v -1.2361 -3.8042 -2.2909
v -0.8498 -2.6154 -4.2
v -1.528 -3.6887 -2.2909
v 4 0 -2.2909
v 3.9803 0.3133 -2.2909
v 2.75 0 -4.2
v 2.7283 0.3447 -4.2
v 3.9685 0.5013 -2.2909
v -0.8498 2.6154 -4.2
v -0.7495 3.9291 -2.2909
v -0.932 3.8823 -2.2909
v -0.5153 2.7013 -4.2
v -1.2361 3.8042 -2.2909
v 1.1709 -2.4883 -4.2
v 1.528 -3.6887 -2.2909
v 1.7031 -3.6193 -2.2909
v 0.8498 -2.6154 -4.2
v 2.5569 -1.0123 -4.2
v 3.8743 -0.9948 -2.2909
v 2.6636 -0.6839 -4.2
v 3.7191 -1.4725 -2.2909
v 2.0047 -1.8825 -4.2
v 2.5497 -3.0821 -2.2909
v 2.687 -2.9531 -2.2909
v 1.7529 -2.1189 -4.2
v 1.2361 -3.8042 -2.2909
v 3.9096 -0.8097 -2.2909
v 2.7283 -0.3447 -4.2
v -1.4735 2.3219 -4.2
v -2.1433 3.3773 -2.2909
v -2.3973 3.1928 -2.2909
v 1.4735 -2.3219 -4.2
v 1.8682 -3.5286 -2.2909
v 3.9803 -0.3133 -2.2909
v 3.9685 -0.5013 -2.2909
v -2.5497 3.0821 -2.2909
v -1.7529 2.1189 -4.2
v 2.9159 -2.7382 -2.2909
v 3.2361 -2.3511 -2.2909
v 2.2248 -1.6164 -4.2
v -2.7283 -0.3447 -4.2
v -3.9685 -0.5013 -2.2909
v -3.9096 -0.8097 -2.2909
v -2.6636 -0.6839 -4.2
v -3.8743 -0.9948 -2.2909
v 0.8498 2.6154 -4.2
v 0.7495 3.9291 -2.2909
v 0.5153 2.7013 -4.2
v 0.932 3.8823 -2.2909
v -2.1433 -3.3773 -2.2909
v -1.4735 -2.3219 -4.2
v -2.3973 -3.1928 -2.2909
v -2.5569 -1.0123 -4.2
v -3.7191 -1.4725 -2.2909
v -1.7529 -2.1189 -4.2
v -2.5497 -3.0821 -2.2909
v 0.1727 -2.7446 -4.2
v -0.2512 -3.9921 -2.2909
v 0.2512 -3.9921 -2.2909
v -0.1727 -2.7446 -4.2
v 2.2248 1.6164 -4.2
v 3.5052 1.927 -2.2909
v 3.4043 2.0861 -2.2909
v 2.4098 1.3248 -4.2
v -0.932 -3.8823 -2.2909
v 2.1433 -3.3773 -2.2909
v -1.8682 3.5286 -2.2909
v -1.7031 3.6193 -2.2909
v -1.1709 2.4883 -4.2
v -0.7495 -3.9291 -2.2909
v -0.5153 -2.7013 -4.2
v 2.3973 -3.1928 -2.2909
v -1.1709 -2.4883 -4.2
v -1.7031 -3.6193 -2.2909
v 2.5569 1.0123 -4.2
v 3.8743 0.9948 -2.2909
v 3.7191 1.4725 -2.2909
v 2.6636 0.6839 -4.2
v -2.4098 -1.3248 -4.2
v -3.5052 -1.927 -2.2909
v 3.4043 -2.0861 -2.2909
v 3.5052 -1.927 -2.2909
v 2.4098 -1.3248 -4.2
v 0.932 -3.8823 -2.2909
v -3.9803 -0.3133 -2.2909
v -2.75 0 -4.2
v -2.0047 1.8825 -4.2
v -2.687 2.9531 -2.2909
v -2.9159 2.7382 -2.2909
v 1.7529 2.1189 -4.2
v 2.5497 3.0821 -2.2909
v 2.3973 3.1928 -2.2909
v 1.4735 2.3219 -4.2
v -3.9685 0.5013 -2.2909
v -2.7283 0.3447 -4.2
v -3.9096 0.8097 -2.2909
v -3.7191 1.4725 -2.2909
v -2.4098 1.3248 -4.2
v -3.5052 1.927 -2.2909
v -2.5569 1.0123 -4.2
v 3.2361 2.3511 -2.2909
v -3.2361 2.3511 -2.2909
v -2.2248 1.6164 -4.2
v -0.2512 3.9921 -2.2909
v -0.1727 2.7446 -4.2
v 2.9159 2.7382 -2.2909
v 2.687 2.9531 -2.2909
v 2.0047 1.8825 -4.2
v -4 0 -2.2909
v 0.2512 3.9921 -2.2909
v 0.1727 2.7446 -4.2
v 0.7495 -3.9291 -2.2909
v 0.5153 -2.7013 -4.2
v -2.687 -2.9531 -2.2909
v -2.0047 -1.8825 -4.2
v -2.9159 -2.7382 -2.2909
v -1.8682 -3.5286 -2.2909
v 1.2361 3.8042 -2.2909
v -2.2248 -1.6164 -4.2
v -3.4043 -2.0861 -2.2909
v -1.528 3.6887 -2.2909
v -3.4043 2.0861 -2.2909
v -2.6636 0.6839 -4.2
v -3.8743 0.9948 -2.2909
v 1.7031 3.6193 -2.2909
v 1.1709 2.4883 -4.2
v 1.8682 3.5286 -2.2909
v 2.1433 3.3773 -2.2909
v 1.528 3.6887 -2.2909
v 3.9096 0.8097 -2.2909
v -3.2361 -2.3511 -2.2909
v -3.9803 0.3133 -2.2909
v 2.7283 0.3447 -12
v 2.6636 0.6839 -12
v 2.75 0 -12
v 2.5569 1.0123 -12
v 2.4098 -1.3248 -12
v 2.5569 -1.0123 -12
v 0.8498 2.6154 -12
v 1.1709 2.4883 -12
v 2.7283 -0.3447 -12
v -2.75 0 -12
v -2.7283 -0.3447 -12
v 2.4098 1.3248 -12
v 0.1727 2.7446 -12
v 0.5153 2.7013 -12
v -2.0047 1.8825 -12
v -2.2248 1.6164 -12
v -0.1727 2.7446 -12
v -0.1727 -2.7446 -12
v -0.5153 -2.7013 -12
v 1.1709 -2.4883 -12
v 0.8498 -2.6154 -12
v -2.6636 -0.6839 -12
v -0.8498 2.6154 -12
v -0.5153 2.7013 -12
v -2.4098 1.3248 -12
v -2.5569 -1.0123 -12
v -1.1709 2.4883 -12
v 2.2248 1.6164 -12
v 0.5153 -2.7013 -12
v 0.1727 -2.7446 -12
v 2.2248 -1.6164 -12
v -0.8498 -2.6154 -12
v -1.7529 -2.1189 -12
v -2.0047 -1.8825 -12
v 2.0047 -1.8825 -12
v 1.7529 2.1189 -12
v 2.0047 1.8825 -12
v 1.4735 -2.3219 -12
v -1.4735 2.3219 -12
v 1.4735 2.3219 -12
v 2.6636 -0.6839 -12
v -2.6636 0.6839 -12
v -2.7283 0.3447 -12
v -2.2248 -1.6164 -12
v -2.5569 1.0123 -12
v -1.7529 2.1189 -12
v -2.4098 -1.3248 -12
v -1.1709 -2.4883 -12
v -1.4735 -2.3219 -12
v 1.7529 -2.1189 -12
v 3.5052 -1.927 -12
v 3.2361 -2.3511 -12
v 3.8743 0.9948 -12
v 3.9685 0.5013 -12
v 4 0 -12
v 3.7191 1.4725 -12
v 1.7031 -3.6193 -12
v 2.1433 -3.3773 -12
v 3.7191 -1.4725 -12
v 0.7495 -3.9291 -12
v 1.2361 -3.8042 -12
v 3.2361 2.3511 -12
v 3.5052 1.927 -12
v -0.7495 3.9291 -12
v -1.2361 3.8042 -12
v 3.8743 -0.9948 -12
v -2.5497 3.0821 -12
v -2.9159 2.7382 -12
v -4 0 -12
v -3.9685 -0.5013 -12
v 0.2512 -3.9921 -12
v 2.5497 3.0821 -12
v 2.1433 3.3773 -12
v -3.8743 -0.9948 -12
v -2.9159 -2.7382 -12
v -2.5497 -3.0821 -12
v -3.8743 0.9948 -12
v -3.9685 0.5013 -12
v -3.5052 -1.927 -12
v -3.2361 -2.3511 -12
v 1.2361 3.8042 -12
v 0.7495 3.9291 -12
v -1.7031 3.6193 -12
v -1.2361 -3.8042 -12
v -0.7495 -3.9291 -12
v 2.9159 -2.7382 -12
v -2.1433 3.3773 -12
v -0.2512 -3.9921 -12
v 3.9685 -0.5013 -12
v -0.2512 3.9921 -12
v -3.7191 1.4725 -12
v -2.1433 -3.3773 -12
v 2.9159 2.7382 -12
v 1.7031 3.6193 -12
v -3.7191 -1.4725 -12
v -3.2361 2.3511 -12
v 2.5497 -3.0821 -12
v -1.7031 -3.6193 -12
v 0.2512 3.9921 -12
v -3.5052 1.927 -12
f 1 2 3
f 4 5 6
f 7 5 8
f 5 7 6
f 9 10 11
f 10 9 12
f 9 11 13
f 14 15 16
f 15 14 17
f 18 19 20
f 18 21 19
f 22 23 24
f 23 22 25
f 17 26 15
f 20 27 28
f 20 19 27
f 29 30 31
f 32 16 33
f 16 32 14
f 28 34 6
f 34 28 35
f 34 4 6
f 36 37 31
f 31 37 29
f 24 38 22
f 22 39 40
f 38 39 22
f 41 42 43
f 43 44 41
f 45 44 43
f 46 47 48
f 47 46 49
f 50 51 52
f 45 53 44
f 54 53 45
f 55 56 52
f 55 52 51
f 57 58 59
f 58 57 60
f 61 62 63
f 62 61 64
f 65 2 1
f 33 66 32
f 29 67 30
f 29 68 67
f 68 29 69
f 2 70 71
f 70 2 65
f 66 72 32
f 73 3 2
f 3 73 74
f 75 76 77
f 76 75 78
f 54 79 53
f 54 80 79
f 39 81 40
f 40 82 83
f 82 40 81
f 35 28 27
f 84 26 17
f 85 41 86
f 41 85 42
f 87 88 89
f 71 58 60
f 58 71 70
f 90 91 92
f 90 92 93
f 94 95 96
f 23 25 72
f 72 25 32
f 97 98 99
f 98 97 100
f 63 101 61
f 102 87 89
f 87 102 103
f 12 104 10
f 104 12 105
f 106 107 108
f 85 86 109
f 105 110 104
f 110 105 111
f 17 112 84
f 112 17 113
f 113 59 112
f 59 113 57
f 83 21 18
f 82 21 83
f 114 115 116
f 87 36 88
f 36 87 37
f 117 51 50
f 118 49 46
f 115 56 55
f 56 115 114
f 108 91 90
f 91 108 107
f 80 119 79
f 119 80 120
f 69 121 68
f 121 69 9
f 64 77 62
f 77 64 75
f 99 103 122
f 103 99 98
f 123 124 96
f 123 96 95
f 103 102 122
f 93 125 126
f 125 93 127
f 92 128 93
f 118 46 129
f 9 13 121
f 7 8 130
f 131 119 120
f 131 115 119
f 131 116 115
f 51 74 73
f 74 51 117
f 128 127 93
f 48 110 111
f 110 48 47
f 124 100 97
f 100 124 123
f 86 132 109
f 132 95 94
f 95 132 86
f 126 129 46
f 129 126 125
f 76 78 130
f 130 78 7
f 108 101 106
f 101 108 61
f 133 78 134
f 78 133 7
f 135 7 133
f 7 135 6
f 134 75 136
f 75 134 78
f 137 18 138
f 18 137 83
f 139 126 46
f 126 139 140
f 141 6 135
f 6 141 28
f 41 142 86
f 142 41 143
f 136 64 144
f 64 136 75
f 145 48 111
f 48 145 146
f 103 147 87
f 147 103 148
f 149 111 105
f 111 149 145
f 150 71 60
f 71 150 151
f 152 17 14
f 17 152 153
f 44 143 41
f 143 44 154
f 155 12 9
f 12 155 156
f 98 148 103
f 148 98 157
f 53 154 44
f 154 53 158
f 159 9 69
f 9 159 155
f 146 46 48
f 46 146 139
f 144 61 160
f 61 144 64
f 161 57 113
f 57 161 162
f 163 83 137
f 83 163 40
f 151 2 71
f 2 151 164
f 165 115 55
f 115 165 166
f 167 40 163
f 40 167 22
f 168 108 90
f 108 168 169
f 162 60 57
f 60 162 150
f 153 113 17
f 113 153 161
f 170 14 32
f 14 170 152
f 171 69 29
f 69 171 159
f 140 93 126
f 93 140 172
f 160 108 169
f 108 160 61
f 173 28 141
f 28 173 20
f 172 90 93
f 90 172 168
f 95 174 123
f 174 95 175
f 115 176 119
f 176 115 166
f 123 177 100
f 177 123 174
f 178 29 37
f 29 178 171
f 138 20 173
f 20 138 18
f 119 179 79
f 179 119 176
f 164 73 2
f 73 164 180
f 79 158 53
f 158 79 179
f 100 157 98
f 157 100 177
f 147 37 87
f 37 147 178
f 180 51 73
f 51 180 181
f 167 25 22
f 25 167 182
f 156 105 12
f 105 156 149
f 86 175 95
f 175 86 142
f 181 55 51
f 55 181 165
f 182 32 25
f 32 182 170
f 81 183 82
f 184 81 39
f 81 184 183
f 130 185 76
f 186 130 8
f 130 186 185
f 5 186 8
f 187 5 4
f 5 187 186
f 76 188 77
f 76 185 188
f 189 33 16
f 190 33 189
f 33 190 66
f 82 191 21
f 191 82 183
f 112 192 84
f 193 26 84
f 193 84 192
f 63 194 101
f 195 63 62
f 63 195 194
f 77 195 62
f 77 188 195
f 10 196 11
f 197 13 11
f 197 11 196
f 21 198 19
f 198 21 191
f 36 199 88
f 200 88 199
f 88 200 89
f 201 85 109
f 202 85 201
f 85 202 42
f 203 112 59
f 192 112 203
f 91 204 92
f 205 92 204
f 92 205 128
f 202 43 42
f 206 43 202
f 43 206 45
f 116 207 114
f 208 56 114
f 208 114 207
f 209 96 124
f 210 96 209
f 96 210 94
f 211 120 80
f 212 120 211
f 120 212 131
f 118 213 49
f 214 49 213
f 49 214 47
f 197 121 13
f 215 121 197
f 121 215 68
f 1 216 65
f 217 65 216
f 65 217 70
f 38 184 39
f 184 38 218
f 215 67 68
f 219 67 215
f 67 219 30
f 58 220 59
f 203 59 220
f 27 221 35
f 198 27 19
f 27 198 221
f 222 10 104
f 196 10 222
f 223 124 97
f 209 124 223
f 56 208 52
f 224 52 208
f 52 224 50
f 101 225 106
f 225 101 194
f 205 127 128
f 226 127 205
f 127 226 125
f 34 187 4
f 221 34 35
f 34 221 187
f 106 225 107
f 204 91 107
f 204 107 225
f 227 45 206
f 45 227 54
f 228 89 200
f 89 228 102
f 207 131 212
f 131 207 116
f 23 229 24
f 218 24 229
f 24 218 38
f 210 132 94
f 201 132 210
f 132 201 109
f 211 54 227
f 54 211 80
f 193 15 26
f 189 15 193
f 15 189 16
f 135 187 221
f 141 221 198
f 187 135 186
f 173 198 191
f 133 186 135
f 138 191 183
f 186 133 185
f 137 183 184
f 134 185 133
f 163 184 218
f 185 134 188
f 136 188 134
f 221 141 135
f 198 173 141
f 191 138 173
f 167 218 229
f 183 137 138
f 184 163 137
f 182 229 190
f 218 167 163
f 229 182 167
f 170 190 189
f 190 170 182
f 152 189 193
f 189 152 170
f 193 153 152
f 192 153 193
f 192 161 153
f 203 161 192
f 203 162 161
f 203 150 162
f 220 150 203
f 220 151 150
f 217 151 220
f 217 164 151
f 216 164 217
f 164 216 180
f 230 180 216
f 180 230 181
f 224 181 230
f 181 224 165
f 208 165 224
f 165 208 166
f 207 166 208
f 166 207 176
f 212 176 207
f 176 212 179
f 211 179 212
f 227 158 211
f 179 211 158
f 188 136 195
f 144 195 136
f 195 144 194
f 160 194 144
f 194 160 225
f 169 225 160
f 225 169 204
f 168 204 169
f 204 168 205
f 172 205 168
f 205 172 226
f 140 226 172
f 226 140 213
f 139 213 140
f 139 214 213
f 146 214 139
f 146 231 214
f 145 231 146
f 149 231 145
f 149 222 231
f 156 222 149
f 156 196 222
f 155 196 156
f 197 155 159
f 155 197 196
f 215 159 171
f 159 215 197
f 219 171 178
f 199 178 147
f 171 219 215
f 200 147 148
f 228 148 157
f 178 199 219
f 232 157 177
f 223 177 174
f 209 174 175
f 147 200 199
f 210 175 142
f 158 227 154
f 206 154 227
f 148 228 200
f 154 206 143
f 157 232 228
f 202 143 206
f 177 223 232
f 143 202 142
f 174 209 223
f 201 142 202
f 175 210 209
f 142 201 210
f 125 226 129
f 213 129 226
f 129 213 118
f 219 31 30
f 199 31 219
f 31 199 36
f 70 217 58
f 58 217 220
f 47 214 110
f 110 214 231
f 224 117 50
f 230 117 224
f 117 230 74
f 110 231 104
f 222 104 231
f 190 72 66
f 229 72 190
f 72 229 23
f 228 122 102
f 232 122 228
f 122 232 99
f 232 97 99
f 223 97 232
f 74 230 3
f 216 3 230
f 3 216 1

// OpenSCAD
$fn = 50;

difference() {
	union() {
		translate(v = [0, 0, -12.0]) {
			cylinder(h = 15, r = 4.0);
		}
	}
	union() {
		translate(v = [0, 0, 0]) {
			rotate(a = [0, 0, 0]) {
				difference() {
					union() {
						translate(v = [0, 0, -15.0]) {
							cylinder(h = 15, r = 2.25);
						}
						translate(v = [0, 0, -4.2]) {
							cylinder(h = 4.2, r1 = 2.75, r2 = 5.5);
						}
						translate(v = [0, 0, -15.0]) {
							cylinder(h = 15, r = 2.75);
						}
						translate(v = [0, 0, -15.0]) {
							cylinder(h = 15, r = 2.25);
						}
					}
					union();
				}
			}
		}
		#cylinder(h = 3, r = 6.25);
	}
}
